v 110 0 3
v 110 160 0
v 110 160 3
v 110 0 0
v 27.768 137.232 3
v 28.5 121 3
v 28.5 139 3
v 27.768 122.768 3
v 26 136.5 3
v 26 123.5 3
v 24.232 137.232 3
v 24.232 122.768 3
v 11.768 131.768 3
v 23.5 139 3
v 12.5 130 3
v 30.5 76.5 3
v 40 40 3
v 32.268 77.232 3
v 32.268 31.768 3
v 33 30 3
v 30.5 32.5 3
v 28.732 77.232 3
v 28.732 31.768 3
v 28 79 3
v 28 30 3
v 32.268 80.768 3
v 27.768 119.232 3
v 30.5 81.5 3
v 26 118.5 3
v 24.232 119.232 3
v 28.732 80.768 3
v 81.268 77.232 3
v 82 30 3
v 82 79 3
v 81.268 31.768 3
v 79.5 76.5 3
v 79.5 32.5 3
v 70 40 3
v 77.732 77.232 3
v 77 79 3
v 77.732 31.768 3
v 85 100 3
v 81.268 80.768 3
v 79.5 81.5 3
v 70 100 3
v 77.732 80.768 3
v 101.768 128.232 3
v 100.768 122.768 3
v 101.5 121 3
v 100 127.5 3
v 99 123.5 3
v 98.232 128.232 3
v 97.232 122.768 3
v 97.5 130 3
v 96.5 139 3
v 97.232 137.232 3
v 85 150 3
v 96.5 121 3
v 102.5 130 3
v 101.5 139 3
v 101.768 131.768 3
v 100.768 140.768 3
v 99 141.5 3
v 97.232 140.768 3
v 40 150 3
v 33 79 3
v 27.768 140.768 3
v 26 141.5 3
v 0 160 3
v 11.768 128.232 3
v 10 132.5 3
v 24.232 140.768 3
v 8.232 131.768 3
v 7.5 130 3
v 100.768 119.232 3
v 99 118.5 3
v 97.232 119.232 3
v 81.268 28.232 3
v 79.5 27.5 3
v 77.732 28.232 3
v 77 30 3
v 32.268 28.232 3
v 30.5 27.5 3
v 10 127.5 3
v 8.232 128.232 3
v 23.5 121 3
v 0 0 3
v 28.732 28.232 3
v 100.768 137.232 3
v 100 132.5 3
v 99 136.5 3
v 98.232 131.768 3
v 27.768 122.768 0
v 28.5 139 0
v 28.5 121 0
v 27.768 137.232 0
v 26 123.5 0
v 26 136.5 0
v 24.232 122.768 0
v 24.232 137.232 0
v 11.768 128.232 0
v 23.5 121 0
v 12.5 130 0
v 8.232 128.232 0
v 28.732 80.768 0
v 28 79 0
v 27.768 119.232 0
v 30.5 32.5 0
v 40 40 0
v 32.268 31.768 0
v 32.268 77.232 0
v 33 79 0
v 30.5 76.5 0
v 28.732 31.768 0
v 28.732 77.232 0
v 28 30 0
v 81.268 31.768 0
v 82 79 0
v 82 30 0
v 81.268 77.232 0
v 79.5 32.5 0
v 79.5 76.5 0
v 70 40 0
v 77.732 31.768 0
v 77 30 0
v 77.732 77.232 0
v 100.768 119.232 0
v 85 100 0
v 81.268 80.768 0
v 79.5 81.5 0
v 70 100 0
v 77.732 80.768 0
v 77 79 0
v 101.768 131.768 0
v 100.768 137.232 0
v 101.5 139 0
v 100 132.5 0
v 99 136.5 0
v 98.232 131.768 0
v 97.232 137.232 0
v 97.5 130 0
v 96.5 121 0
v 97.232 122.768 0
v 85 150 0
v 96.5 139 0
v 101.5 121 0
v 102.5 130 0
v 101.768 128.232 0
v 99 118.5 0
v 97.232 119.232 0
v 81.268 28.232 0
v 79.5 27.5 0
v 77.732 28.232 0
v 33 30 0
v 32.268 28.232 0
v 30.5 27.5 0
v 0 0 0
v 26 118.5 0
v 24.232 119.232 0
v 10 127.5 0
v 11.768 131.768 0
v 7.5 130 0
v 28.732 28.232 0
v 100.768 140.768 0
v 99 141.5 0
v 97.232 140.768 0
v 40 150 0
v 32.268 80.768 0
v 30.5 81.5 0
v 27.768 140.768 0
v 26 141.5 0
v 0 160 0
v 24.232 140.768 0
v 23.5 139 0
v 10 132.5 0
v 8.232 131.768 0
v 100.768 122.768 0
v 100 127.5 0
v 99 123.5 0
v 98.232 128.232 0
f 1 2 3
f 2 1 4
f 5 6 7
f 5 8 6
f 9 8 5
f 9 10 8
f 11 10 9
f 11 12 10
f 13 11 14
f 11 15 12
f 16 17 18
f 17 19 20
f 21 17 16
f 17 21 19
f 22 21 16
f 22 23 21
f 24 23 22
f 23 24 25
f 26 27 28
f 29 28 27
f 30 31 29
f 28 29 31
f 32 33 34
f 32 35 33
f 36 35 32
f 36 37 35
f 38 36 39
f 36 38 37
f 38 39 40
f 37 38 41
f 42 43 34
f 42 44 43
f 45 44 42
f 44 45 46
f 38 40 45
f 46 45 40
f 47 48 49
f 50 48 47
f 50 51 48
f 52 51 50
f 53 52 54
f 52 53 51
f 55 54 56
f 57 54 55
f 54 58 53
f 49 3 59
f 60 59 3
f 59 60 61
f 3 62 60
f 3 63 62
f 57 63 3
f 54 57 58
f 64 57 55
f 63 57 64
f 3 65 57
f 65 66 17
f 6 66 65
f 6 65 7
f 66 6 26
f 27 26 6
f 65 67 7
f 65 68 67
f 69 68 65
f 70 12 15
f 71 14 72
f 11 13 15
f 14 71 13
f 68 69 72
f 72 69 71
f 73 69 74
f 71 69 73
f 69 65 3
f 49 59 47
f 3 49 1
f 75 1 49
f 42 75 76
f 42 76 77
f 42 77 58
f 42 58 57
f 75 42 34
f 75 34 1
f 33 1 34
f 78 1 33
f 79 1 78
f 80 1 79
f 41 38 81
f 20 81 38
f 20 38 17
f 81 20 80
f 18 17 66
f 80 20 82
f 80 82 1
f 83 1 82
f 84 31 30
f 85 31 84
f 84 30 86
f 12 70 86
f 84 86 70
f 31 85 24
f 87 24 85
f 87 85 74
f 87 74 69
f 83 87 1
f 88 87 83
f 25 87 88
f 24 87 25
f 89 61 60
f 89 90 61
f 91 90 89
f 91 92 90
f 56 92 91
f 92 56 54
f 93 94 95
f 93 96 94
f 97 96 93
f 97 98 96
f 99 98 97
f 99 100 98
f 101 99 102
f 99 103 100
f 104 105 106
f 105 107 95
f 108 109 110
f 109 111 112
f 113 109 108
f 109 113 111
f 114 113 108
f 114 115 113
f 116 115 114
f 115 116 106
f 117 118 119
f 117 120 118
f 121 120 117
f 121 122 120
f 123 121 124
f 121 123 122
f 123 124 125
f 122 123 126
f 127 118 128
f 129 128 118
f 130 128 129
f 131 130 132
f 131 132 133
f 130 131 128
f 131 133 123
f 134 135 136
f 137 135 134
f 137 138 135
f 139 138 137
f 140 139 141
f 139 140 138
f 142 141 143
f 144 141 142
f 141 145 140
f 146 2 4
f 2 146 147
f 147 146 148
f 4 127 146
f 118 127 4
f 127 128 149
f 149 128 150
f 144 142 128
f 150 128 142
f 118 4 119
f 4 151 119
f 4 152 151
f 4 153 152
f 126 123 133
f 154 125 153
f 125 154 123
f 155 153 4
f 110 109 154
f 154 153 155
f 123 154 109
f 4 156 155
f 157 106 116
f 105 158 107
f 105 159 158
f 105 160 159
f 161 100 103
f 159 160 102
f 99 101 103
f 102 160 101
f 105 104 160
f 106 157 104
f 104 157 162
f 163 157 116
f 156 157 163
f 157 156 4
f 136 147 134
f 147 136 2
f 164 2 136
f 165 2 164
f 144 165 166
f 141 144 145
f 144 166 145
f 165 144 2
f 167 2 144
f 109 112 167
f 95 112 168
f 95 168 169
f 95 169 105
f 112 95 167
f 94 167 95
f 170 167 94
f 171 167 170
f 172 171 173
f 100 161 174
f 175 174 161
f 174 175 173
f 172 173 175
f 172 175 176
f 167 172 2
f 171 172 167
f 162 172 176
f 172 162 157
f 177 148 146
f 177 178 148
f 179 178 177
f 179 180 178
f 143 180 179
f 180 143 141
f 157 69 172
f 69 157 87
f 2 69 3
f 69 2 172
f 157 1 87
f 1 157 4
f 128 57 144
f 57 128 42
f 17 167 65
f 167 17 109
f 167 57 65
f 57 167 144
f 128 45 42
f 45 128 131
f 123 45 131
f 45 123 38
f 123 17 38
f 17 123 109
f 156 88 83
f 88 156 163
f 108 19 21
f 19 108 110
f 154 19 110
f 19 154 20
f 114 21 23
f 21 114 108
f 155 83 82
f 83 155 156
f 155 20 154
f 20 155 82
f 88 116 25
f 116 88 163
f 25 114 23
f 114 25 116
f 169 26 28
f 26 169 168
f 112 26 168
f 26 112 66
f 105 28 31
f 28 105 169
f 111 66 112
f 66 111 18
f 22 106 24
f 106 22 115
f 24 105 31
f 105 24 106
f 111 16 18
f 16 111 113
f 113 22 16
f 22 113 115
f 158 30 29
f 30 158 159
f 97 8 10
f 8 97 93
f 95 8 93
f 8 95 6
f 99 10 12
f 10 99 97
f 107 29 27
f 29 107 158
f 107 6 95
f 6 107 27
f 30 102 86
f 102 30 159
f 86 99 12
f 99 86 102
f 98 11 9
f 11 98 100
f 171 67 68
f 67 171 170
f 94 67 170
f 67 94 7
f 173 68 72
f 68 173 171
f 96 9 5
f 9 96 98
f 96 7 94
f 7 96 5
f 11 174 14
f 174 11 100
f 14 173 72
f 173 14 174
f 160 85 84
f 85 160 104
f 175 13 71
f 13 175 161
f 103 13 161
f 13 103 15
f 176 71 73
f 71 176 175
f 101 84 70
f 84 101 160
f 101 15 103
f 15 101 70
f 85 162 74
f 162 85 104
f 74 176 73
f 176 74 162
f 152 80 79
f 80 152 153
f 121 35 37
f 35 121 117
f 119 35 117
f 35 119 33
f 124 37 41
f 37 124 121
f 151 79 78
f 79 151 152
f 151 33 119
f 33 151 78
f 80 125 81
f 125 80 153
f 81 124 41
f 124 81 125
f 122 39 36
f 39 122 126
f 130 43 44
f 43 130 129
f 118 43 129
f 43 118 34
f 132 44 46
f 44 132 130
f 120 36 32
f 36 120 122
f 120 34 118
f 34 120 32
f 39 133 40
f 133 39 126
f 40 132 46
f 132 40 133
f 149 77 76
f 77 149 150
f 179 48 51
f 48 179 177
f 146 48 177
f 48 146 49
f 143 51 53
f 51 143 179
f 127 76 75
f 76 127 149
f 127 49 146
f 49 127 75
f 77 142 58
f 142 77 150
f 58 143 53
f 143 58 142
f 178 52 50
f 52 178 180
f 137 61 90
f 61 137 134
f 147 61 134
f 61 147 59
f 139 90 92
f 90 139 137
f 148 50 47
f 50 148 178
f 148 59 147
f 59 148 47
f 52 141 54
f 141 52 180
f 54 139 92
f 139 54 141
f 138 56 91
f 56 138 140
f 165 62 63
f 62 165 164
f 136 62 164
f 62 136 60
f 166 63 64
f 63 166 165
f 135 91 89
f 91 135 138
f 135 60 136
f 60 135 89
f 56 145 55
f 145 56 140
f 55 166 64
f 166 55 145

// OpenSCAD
difference(){
    cube([110,160, 3]);
    translate([40,100,0])cube([45,50,6]);
    translate([40,40,0])cube([30,60,6]);
    translate([30.5,30,0])cylinder(d=5,h=8);
    translate([30.5,79,0])cylinder(d=5,h=8);
    
    translate([26,121,0])cylinder(d=5,h=8);
    translate([26,139,0])cylinder(d=5,h=8);
    
    translate([10,130,0])cylinder(d=5,h=8);
    
    translate([79.5,30,0])cylinder(d=5,h=8);
    translate([79.5,79,0])cylinder(d=5,h=8);
    
    translate([99,121,0])cylinder(d=5,h=8);
    translate([100,130,0])cylinder(d=5,h=8);
    translate([99,139,0])cylinder(d=5,h=8);
}
